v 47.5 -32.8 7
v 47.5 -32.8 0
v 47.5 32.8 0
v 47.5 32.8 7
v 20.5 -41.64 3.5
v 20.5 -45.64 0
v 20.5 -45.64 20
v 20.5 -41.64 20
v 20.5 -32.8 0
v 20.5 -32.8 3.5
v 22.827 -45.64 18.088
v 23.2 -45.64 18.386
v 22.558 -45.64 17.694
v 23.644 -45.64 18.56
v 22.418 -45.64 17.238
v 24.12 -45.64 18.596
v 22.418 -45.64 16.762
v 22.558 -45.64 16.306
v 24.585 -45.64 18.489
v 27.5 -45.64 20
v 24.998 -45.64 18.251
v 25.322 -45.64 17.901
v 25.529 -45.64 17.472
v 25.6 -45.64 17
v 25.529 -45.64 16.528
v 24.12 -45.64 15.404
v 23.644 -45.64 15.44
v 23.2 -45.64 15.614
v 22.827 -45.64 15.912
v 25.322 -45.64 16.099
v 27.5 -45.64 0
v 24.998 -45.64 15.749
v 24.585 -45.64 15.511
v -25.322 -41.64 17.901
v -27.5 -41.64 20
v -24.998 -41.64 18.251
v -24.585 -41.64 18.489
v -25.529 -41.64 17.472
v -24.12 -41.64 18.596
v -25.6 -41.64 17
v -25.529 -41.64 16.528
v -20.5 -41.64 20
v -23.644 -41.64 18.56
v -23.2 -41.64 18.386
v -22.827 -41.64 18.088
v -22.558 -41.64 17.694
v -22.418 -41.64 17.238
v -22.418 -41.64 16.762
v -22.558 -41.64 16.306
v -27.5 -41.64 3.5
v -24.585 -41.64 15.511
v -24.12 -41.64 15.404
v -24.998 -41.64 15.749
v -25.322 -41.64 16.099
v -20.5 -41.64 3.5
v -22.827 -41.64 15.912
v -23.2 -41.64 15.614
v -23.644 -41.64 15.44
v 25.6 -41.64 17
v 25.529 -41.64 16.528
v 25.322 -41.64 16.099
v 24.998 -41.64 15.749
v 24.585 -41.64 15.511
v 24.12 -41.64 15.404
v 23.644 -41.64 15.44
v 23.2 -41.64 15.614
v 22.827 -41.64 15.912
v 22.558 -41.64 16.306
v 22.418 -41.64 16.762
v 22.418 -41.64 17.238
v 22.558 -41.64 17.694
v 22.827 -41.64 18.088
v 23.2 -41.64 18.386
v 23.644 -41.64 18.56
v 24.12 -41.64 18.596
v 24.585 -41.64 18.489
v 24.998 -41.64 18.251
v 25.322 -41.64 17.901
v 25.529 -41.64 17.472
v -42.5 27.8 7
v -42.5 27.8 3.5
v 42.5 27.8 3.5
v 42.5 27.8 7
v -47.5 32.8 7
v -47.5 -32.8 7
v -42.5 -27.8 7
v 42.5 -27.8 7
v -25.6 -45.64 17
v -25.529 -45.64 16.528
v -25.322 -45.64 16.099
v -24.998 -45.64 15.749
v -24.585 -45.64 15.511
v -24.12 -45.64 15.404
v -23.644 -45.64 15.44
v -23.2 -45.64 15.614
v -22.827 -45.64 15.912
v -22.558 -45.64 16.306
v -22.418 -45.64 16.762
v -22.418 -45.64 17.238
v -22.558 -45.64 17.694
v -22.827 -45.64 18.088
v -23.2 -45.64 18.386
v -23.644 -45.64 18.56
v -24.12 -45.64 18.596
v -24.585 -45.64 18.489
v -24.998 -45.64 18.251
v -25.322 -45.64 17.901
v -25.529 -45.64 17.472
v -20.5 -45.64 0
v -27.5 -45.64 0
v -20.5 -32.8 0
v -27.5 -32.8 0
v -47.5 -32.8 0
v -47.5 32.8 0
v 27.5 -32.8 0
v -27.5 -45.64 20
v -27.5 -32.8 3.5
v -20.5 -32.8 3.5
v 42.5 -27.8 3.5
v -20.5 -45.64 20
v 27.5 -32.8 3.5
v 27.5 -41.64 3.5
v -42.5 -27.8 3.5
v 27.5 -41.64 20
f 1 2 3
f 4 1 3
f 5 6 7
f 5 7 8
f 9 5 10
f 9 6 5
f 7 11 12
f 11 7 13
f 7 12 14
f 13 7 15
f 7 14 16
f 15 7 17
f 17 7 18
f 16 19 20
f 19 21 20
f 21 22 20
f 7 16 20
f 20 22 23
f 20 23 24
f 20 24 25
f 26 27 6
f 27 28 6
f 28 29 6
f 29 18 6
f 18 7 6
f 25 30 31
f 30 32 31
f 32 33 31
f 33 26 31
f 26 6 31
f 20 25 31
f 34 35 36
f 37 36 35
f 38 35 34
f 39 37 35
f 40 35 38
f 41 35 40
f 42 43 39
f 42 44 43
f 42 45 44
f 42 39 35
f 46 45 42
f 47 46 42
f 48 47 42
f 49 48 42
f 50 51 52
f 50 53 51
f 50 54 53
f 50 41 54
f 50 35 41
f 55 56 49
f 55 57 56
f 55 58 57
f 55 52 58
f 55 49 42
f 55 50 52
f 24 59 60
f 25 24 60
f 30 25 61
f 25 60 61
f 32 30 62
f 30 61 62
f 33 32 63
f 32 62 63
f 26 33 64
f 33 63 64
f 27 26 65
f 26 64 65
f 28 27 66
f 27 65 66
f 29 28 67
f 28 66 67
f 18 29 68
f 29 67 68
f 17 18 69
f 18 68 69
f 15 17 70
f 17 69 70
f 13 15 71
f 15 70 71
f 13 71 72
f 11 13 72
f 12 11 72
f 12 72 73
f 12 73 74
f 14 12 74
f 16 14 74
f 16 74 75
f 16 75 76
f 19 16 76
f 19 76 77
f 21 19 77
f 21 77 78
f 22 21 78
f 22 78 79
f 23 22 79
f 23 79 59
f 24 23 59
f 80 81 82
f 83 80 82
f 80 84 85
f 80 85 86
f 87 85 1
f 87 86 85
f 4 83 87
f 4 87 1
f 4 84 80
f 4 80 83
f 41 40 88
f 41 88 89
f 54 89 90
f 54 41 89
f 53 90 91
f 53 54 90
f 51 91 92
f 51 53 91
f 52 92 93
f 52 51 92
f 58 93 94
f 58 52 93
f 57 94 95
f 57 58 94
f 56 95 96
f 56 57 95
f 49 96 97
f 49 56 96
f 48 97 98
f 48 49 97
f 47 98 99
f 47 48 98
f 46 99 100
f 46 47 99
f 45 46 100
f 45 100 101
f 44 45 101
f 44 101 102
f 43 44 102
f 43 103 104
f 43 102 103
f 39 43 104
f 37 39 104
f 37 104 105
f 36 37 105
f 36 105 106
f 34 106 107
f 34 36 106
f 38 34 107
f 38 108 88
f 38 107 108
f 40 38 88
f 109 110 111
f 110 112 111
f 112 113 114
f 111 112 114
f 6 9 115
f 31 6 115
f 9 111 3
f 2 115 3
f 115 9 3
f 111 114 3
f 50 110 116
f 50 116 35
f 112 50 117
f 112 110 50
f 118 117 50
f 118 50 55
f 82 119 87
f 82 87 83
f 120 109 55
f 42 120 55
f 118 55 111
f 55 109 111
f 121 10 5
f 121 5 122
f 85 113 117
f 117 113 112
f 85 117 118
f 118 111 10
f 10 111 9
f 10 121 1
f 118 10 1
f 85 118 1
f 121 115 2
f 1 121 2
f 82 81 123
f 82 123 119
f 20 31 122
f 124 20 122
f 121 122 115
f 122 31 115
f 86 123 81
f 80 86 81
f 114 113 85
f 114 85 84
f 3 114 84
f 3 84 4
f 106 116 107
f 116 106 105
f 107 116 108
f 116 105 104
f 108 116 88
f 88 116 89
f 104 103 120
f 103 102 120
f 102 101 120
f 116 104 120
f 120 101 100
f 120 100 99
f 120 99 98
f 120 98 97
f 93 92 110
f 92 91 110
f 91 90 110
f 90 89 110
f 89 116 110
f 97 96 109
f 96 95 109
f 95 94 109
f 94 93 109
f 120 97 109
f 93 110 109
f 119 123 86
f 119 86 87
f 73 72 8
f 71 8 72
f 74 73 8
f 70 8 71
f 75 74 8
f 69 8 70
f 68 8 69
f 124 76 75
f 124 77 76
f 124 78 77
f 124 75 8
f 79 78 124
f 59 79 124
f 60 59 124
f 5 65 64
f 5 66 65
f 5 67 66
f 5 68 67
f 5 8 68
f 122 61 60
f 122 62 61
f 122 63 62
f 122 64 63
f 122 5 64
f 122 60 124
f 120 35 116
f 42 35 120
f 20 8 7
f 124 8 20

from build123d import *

# Parameters (mm, degrees)
SKETCH1_W           = 85
SKETCH1_H           = 55.6
BOSS_EXTRUDE1_DEPTH = 3.5
SKETCH1_4_W         = 95
SKETCH1_4_H         = 65.6
SKETCH1_4_W_2       = 85
SKETCH1_4_H_2       = 55.6
BOSS_EXTRUDE2_DEPTH = 7
SKETCH1_5_W         = 7
SKETCH1_5_H         = 8.84
BOSS_EXTRUDE3_DEPTH = 3.5
SKETCH1_6_W         = 7
SKETCH1_6_H         = 4
BOSS_EXTRUDE4_DEPTH = 20
CUT_EXTRUDE1_START  = -79.44
SKETCH2_R           = 1.6
CUT_EXTRUDE1_DEPTH  = 80.44


with BuildPart() as part:
    # Sketch1 → Boss-Extrude1 (new body)
    with BuildSketch(Plane.XY):
        Rectangle(SKETCH1_W, SKETCH1_H)
    extrude(amount=BOSS_EXTRUDE1_DEPTH)

    # Sketch1<4> → Boss-Extrude2 (add)
    with BuildSketch(Plane.XY):
        Rectangle(SKETCH1_4_W, SKETCH1_4_H)
        Rectangle(SKETCH1_4_W_2, SKETCH1_4_H_2, mode=Mode.SUBTRACT)
    extrude(amount=BOSS_EXTRUDE2_DEPTH)

    # Sketch1<5> → Boss-Extrude3 (add)
    with BuildSketch(Plane.XY):
        with Locations((-24, -37.22)):
            Rectangle(SKETCH1_5_W, SKETCH1_5_H)
        with Locations((24, -37.22)):
            Rectangle(SKETCH1_5_W, SKETCH1_5_H)
    extrude(amount=BOSS_EXTRUDE3_DEPTH)

    # Sketch1<6> → Boss-Extrude4 (add)
    with BuildSketch(Plane.XY):
        with Locations((-24, -43.64)):
            Rectangle(SKETCH1_6_W, SKETCH1_6_H)
        with Locations((24, -43.64)):
            Rectangle(SKETCH1_6_W, SKETCH1_6_H)
    extrude(amount=BOSS_EXTRUDE4_DEPTH)

    # Sketch2 → Cut-Extrude1 (cut)
    with BuildSketch(Plane(origin=(0, -45.64, 0), x_dir=(-1, 0, 0), z_dir=(0, -1, 0)).offset(CUT_EXTRUDE1_START)):
        with Locations((24, -17)):
            Circle(SKETCH2_R)
    cut_extrude1 = extrude(amount=CUT_EXTRUDE1_DEPTH, mode=Mode.SUBTRACT)

    # Mirror1: Cut-Extrude1 across plane
    add(cut_extrude1.mirror(Plane(origin=(0, 0, 0), x_dir=(0, 0, 1), z_dir=(1, 0, 0))), mode=Mode.SUBTRACT)


solid = part.part
